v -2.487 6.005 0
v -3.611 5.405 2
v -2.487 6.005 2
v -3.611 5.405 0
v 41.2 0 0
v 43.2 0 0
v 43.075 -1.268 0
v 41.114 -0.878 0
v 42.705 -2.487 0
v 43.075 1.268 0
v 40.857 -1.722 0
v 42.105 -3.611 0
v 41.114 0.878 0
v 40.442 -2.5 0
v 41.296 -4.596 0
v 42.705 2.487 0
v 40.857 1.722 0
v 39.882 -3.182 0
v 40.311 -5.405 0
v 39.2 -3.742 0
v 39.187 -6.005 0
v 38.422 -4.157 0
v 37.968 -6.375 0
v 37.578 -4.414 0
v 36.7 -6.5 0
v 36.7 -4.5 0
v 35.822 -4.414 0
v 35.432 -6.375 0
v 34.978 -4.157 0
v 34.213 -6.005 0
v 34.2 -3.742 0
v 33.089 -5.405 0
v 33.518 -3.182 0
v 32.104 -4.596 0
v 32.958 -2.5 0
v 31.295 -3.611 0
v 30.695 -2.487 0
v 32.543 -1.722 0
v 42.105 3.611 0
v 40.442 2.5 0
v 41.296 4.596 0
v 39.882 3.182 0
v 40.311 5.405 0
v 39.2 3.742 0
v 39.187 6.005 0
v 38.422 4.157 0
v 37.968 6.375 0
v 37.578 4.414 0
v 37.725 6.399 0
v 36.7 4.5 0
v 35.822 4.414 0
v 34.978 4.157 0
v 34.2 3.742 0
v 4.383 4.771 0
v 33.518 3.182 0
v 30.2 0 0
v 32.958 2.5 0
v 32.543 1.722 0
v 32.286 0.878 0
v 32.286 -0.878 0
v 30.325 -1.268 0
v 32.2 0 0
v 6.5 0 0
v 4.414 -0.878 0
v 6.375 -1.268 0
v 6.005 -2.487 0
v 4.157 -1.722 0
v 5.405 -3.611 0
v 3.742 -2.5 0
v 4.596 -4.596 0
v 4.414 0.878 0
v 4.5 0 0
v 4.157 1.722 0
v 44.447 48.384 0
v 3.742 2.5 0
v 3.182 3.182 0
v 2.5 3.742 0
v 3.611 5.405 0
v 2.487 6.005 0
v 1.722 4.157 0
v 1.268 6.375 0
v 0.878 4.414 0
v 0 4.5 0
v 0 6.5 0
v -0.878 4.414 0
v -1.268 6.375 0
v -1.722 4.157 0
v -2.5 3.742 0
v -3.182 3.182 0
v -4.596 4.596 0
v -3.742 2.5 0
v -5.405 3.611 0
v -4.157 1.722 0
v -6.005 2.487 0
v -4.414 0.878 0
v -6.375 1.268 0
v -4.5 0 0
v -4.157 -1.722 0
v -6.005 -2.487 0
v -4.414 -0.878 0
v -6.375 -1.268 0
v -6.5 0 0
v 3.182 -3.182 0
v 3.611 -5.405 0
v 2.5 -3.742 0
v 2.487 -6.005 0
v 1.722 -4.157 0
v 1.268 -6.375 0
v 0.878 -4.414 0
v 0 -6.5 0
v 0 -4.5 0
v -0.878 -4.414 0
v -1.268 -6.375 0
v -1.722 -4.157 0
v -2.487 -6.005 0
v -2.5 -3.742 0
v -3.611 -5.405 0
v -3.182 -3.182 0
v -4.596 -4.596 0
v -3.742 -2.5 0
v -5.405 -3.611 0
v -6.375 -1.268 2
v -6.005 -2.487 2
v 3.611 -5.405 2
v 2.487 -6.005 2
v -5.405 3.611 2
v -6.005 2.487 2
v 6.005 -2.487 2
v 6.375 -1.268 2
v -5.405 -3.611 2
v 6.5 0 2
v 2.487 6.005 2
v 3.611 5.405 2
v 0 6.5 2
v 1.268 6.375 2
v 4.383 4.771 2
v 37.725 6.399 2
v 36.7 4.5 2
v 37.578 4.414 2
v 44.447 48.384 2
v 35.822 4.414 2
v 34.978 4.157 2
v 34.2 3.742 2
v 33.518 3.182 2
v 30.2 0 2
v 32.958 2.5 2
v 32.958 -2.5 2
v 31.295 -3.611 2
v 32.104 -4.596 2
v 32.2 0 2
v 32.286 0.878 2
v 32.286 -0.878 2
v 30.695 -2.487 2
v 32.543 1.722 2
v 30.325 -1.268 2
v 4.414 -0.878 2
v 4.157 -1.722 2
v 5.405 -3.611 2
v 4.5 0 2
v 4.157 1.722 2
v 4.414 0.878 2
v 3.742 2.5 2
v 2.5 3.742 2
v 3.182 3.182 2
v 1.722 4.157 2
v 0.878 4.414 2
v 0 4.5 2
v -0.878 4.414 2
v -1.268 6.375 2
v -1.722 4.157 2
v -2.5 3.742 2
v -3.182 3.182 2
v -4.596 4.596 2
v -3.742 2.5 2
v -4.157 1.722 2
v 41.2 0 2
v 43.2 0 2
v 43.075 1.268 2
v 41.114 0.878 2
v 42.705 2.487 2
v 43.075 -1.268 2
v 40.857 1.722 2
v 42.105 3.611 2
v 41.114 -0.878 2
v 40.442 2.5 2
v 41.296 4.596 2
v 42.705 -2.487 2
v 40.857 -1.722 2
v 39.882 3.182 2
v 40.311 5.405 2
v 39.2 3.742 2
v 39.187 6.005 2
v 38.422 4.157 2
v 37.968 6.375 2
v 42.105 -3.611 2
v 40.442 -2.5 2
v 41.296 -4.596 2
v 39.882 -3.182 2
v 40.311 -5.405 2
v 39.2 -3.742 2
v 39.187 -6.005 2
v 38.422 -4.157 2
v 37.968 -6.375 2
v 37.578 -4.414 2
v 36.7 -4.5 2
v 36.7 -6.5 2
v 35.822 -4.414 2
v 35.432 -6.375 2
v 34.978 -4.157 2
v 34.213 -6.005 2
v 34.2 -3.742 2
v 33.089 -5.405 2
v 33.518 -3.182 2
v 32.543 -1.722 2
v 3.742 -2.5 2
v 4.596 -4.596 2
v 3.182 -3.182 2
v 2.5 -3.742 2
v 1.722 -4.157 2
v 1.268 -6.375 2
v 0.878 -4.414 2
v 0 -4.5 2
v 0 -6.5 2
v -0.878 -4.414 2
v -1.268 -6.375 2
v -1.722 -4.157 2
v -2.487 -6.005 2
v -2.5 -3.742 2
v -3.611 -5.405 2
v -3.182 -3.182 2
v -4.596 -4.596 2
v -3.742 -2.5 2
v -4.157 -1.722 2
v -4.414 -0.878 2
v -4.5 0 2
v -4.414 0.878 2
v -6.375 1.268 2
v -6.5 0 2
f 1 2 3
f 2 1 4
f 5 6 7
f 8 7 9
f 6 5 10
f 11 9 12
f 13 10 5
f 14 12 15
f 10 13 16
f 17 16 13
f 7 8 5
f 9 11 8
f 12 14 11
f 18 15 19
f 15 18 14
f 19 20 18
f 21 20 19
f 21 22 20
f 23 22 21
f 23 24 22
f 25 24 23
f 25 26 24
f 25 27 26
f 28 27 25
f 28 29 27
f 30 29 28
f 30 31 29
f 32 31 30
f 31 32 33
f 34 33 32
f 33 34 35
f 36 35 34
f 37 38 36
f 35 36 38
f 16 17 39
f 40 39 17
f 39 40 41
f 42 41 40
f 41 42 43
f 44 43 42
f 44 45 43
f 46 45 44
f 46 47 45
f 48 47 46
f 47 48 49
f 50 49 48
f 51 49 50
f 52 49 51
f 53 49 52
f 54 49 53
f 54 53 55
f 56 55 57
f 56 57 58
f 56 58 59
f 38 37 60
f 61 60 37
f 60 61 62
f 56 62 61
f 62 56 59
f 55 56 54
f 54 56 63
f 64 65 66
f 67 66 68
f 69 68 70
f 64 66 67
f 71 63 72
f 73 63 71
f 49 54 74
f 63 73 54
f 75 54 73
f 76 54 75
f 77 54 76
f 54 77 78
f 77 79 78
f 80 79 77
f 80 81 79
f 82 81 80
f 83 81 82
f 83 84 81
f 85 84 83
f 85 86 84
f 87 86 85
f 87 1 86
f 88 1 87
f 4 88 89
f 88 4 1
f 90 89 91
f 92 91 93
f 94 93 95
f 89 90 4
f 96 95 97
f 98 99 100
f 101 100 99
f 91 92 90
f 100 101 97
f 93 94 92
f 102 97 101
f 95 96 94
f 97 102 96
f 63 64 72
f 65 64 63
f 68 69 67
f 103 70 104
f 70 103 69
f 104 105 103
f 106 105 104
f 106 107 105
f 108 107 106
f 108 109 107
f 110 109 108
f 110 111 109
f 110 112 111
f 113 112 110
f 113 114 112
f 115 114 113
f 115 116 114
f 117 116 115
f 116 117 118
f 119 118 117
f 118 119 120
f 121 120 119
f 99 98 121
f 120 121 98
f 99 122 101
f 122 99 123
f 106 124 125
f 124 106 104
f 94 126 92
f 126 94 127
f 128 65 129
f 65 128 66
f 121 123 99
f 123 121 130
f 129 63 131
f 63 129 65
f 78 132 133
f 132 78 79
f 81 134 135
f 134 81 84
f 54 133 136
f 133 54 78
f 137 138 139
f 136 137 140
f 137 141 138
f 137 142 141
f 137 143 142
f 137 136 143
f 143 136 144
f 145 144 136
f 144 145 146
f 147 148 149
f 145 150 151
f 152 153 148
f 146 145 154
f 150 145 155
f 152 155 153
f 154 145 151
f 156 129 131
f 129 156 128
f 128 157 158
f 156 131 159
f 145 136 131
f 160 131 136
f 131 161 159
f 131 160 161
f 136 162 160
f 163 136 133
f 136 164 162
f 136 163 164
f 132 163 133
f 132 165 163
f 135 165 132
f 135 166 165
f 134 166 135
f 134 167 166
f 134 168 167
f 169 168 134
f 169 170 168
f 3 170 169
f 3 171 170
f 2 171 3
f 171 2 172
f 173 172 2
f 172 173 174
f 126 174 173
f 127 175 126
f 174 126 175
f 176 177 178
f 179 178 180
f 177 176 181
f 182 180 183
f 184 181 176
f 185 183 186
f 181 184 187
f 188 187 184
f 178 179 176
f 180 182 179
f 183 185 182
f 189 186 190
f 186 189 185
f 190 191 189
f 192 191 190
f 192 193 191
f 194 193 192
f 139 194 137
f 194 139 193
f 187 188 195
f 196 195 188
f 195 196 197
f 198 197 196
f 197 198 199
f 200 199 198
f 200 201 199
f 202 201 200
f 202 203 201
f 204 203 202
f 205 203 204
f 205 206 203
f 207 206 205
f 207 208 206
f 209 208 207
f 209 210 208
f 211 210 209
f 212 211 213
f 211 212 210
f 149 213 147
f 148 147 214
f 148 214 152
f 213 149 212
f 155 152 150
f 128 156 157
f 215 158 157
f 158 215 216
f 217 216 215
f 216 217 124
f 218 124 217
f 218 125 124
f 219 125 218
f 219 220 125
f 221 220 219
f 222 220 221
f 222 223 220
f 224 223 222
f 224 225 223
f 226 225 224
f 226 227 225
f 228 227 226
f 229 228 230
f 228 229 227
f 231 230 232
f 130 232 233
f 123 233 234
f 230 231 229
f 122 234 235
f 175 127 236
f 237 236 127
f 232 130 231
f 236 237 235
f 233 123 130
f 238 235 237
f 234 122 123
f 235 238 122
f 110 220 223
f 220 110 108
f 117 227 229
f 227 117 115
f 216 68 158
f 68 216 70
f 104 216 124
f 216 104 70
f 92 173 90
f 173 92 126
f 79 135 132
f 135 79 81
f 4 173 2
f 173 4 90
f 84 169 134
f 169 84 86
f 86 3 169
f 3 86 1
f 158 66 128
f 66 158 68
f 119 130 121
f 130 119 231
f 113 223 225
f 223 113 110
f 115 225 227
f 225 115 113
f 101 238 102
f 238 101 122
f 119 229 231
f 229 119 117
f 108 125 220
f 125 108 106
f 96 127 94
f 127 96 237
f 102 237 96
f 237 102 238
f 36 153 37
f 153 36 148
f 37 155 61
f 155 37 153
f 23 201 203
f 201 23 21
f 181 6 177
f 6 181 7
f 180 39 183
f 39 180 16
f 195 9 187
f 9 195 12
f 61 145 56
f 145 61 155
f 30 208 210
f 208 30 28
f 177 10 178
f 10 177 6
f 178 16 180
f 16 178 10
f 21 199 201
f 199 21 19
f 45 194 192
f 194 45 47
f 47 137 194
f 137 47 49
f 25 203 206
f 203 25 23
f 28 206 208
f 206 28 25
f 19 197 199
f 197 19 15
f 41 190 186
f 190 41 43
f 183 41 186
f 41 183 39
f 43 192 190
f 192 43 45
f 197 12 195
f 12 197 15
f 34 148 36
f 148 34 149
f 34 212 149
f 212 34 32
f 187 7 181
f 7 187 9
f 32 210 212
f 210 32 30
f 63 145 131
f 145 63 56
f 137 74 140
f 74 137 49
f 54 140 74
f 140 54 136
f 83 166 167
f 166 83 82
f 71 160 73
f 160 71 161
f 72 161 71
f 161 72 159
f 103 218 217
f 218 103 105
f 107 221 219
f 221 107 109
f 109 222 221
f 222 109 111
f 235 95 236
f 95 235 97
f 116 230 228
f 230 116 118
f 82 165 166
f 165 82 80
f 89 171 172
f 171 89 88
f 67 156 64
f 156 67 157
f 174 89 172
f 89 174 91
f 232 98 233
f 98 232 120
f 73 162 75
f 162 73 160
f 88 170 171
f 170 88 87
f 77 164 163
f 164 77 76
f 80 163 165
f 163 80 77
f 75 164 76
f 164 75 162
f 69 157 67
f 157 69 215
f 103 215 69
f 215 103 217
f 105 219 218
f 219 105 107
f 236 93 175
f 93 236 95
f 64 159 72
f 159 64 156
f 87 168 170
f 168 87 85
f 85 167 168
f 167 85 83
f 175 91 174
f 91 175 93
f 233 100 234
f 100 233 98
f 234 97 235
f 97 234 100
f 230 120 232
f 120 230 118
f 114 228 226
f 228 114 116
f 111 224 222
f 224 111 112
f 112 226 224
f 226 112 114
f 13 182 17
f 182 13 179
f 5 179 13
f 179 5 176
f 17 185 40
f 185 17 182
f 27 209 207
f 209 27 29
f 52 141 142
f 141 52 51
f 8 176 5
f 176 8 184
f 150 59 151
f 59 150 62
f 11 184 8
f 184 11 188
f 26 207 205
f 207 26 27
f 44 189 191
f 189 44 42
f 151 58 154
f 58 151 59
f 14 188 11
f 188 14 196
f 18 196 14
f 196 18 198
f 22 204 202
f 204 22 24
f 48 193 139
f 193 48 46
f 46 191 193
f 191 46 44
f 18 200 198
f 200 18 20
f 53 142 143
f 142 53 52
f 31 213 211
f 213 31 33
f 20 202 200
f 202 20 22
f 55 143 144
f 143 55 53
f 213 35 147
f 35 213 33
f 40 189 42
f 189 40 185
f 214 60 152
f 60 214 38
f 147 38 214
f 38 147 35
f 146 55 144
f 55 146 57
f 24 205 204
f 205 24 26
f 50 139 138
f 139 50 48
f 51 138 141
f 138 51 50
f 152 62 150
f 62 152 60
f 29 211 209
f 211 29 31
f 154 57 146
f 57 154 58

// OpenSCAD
// file: Settings.scad
// -- Parameters --------------------------

$fn = 32;

// radius of the hole in the outer joint
r1 = 2;

// radius of the hole in the piece
r2 = 4.5;

// radius of the base of joints and width of sticks
r3 = 6.5;

// height of sticks and thickness of pieces.
h = 2;

// height of the base of the joints
h_base = 1;


// -- Base elements ----------------------

module joint(height=h, radius=r3) {
	cylinder(h=height, r=radius);
}

module joint_axis(height=h, radius=r2) {
	cylinder(h=height*10, r=radius, center=true);
}

module joint_sqaxis(height=h, radius=r2, delta_r=0.35) {
 	side = cos(45) * (radius * 2) - delta_r;
 	cube([side, side, height], center=true);
}

module bar(length, height=h, width=r3) { cube(size=[length, width, height]); }

// -- Utility ------------------------------

module at(x, y) {
	translate((2 * r3 + 3) * [x, y, 0]) child(); 
}

module atPoints2(p0, p1) {
	translate(p0) { child(); }
	translate(p1) { child(); }
}

module atPoints3(p0, p1, p2) {
	translate(p0) { child(); }
	translate(p1) { child(); }
	translate(p2) { child(); }
}

module atEnd(length) { atPoints2([0, 0, 0], [length, 0, 0]) child(); }
// main file
include <Settings.scad>

//
//          p3
//          *
//         / \
//      b /   \ a
//       /     \
//      /       \
//     *---------*
//    p1    c    p2
//
module phalange(a=49.0, b=65.7, c=36.7, height=h, radius2=r2, radius3=r3) {
	h = height;

	alpha = acos((b*b + c*c - a*a) / (2*b*c));

	p1 = [0, 0];
    p2 = [c, 0];
    p3 = [cos(alpha)*b, sin(alpha)*b];

	P1 = [0, 0, 0];
    P2 = [c, 0, 0];
    P3 = [cos(alpha)*b, sin(alpha)*b, 0];

	difference() {
		union() {
			linear_extrude(height=height) {
				polygon(points=[p1,p2,p3]);
			}
	
			atPoints2(P1,P2) joint(height, radius3);
		}
		atPoints2(P1,P2) joint_axis(height, radius2);
	}
}

phalange();
